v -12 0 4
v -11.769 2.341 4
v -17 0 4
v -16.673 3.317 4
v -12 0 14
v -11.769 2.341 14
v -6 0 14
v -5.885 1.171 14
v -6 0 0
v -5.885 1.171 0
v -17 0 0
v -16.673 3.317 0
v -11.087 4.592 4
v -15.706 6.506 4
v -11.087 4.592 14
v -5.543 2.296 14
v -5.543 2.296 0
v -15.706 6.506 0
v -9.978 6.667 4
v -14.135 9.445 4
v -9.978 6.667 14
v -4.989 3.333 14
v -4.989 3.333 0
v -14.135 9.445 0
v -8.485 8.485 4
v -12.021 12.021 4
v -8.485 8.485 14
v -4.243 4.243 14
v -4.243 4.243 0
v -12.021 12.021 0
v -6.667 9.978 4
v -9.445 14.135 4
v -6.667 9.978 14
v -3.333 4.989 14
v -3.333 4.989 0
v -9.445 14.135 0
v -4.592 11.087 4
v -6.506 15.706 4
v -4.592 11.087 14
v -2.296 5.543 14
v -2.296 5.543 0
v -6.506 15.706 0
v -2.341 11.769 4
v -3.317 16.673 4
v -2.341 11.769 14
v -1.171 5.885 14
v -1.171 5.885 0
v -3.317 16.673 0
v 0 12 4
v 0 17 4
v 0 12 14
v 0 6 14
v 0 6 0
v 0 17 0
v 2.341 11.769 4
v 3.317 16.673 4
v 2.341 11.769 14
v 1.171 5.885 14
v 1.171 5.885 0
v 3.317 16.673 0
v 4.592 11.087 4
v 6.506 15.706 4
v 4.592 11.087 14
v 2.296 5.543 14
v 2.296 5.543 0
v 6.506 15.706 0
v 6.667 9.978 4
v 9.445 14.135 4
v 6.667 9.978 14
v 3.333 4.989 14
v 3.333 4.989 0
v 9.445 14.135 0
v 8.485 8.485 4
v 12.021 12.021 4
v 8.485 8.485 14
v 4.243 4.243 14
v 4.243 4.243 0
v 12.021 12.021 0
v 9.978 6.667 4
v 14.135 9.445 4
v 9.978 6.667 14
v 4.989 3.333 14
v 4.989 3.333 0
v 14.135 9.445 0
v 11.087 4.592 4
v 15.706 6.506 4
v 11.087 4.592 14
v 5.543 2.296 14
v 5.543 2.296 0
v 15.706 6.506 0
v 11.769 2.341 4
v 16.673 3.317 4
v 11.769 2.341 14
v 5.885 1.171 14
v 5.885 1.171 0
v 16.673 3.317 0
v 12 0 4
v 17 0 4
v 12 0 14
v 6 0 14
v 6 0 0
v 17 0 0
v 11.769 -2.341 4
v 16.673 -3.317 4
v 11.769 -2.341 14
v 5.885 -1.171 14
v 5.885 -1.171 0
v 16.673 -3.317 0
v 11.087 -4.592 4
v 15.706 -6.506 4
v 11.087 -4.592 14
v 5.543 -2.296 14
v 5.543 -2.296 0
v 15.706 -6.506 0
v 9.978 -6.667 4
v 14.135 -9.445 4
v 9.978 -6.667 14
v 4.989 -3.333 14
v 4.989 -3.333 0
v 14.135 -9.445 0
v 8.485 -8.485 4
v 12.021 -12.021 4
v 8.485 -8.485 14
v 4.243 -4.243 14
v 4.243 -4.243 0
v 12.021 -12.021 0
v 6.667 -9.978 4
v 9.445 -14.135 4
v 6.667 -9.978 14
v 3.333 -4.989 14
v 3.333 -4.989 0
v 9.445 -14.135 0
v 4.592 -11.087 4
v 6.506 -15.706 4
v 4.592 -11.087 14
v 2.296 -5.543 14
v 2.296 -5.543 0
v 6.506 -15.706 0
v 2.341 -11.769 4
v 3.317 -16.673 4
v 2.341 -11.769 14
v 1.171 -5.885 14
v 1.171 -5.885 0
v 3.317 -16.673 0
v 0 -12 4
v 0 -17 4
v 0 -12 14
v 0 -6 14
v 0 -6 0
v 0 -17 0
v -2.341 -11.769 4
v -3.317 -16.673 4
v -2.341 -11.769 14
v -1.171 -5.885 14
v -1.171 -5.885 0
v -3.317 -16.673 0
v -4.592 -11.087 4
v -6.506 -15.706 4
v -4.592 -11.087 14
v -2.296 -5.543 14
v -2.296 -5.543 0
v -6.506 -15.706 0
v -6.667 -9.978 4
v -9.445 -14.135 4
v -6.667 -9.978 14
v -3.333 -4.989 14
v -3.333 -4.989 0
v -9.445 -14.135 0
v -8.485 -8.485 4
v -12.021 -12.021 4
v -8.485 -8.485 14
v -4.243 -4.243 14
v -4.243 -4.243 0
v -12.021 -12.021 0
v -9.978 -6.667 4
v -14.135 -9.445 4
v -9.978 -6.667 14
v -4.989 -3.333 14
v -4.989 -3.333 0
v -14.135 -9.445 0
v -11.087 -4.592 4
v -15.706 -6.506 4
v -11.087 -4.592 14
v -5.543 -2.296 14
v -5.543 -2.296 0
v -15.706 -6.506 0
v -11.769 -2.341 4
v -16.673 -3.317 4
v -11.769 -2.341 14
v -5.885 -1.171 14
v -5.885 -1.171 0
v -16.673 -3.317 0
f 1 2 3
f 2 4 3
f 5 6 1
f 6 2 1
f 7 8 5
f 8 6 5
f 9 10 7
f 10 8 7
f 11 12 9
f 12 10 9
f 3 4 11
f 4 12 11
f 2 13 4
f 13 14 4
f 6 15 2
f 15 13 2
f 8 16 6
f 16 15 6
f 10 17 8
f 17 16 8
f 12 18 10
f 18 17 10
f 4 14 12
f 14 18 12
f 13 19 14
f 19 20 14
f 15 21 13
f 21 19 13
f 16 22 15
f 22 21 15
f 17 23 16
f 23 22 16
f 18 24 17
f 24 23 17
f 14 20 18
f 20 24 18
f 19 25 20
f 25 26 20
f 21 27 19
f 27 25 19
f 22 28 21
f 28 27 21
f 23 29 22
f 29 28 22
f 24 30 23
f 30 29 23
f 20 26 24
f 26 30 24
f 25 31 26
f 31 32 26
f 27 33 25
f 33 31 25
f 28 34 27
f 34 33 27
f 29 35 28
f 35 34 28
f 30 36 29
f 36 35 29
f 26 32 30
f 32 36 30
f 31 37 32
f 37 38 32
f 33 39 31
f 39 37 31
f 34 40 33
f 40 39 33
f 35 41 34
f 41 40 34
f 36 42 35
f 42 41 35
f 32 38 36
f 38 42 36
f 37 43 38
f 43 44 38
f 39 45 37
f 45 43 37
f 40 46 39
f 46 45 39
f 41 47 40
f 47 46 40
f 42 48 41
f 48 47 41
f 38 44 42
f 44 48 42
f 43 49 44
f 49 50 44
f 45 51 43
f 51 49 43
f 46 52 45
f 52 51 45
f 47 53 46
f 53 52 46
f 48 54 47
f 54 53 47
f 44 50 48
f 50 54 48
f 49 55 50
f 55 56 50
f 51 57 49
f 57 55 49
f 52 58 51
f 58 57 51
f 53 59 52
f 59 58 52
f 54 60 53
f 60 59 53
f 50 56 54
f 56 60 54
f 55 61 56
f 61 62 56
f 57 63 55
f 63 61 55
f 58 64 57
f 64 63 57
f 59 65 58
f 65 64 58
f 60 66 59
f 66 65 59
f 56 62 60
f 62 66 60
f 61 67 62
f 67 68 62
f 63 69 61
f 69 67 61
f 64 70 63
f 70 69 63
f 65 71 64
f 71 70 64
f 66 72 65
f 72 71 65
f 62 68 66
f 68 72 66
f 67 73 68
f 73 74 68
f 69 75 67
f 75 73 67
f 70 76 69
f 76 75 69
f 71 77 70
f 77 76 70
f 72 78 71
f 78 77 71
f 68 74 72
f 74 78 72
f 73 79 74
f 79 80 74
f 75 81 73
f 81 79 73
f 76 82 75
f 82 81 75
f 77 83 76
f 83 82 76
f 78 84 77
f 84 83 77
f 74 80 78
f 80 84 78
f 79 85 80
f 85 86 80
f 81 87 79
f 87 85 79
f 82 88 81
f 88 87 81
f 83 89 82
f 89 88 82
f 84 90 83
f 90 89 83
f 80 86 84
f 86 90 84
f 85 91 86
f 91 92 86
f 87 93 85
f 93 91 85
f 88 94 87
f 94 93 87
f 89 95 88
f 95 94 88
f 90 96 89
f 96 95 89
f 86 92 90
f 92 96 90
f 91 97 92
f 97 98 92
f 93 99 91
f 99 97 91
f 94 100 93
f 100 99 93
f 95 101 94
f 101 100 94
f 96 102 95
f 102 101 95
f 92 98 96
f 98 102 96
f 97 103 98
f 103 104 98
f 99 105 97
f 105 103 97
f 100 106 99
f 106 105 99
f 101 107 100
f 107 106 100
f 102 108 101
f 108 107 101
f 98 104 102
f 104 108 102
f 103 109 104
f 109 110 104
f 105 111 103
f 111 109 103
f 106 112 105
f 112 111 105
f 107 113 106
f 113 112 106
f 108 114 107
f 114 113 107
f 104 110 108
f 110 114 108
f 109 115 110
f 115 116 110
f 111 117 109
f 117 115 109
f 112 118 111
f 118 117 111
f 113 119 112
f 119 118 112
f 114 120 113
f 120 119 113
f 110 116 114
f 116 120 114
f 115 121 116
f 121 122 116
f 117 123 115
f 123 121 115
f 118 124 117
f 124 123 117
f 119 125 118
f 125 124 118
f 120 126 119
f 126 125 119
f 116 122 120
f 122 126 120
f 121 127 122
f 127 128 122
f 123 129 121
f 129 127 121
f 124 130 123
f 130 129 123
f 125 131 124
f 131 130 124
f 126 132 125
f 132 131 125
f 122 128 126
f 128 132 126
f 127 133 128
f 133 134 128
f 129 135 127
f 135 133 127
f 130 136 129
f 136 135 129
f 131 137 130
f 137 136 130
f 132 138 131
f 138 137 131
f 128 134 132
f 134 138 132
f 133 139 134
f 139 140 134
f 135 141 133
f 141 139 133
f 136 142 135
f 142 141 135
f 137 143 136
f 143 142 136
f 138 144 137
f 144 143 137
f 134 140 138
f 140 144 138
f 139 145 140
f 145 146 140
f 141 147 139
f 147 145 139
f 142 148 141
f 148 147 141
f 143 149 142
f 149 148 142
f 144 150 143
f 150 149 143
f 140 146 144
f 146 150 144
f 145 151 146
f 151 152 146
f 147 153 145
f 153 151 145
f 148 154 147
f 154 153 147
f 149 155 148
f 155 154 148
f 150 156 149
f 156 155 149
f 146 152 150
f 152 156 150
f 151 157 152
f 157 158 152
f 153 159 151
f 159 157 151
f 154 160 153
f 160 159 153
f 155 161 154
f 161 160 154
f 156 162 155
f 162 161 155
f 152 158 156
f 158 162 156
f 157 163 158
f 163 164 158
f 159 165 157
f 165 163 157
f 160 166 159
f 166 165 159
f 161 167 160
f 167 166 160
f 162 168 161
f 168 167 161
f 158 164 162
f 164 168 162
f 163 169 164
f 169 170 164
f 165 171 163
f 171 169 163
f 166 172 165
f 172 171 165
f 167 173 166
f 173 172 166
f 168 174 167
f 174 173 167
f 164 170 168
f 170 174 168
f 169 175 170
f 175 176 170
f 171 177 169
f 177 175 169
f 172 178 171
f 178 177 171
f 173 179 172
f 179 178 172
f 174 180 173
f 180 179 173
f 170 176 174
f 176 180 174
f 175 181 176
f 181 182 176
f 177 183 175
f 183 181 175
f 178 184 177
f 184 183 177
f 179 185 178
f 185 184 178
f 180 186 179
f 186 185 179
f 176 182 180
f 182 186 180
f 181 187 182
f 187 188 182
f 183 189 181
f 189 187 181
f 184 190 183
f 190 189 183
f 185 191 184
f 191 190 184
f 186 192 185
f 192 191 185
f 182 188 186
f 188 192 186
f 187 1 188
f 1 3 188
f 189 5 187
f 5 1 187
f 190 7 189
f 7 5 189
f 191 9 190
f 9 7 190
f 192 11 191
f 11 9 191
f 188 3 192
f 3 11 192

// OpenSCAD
$fn = 32;

// ----------------------------------------------------------------------
// Arc stop: collar, 14 mm thick
// ----------------------------------------------------------------------

// --- parameters (mm) ---
revolve_angle = 360;      // full turn around the Z axis
profile_points = 6;       // points of the closed outline

profile = [[6, 0], [17, 0], [17, 4], [12, 4], [12, 14], [6, 14]];  // single closed polygon, 6 points, counter clockwise

// --- the one profile operation ---
rotate_extrude(angle = revolve_angle) polygon(points = profile);
